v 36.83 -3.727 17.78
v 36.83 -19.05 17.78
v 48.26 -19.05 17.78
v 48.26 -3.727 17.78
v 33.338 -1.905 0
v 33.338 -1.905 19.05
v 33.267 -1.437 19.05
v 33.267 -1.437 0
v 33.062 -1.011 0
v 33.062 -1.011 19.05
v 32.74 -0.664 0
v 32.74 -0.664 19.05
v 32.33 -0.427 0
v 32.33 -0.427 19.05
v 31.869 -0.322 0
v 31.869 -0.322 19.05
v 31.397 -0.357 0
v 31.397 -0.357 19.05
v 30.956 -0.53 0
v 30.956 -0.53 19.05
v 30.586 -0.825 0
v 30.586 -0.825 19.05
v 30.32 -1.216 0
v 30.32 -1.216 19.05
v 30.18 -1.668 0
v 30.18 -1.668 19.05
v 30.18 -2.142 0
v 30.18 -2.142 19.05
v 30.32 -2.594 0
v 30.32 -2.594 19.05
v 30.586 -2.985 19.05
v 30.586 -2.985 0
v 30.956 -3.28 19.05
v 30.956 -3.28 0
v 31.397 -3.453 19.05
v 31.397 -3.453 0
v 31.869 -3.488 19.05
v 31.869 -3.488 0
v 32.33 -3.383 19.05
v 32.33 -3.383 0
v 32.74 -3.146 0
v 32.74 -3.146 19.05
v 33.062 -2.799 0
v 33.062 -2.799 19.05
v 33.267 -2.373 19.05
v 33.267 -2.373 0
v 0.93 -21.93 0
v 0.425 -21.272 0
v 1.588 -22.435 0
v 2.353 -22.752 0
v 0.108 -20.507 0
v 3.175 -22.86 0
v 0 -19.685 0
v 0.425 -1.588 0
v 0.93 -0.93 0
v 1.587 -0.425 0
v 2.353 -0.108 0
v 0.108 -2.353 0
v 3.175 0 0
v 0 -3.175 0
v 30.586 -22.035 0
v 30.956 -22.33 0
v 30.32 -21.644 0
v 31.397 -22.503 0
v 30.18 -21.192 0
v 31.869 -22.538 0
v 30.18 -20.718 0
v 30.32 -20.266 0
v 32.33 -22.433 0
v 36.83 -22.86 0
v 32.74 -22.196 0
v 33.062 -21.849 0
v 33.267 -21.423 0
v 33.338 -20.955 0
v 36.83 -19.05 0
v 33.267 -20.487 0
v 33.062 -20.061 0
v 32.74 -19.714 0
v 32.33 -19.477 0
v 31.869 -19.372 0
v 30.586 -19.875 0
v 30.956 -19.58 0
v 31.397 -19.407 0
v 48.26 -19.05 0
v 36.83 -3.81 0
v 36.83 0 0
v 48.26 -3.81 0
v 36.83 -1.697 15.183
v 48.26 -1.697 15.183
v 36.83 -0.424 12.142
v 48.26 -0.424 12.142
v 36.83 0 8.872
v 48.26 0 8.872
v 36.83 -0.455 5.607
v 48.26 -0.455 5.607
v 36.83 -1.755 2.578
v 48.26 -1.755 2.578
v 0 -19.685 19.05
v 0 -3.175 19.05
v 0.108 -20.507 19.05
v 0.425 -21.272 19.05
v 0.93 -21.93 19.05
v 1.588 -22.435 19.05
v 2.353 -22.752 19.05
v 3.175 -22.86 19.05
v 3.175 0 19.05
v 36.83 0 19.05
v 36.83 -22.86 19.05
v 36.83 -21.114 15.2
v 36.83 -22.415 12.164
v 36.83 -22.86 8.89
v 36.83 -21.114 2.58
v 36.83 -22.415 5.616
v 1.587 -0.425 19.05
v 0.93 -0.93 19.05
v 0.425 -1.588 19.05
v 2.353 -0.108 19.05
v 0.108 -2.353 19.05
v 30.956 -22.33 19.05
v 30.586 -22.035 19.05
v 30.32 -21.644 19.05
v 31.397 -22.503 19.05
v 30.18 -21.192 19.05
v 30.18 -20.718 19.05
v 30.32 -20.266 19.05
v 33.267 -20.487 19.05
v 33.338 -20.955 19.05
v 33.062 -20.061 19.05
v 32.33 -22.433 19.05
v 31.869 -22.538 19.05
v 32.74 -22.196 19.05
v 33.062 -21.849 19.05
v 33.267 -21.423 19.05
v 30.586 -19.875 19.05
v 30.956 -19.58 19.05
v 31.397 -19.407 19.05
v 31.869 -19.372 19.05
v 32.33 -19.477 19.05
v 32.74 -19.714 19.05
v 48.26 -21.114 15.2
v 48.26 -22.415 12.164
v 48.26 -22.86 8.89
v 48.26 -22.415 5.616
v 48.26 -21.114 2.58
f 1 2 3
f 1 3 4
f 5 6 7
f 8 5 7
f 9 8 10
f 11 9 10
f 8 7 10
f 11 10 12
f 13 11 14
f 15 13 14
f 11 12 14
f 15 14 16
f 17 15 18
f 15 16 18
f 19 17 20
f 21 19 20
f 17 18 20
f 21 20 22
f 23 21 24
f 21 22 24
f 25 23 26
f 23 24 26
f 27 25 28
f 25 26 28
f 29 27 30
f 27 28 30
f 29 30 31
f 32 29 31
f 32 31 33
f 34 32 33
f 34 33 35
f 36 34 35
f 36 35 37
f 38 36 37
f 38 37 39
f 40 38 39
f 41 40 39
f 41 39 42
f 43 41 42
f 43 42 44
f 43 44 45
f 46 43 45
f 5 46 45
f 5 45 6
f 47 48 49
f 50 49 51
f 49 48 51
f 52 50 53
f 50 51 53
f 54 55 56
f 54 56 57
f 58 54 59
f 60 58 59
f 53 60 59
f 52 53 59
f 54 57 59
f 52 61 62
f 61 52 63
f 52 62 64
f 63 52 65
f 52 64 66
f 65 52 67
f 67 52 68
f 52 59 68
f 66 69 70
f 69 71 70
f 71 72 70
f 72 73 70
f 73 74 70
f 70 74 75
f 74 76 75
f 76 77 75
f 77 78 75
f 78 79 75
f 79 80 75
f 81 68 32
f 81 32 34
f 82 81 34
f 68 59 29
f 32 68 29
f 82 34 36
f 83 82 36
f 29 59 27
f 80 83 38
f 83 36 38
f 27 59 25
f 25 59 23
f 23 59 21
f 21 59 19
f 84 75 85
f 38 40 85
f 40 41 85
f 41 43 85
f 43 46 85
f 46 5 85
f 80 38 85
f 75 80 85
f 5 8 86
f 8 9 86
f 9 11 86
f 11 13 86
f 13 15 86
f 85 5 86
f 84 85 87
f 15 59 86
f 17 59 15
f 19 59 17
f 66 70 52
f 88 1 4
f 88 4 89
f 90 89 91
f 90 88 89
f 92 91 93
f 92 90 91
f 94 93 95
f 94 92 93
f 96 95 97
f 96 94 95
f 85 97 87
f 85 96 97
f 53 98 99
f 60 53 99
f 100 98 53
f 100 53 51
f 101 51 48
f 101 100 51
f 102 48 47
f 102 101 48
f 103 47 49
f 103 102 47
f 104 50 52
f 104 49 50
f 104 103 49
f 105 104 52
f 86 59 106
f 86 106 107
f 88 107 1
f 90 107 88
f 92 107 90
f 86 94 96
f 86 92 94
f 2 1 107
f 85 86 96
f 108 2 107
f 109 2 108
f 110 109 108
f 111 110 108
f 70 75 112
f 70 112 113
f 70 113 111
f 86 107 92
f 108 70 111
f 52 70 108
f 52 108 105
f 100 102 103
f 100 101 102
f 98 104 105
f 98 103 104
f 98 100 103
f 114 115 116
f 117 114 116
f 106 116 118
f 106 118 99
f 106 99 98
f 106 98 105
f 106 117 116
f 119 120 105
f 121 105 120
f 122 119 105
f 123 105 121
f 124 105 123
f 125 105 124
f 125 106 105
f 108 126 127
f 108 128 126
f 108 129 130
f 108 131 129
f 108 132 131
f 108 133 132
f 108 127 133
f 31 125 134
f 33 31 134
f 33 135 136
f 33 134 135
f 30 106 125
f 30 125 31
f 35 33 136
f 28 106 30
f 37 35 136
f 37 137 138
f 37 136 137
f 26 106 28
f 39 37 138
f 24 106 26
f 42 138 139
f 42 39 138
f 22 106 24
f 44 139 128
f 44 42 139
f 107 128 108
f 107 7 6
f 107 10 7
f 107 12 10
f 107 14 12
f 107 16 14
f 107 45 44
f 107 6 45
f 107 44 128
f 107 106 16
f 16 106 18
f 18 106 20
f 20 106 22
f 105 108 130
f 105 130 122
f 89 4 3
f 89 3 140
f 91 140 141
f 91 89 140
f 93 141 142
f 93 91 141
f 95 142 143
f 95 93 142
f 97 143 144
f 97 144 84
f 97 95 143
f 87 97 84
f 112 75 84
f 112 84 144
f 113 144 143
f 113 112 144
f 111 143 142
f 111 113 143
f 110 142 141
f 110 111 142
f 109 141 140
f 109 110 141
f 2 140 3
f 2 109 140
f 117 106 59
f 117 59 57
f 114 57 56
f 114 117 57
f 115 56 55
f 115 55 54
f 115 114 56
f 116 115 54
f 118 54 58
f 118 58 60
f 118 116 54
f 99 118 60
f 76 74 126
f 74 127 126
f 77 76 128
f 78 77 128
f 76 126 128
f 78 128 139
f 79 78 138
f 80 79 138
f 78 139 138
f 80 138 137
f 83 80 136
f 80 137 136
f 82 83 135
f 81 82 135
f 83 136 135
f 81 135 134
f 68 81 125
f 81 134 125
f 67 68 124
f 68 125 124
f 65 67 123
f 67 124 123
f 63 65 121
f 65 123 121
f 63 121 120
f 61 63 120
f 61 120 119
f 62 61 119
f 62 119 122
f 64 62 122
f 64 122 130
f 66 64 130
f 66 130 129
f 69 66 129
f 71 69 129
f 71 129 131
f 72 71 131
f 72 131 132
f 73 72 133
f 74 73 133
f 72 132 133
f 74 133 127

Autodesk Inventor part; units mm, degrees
ref_plane "YZ Plane" through (0, 0, 0) normal (1, 0, 0) x (0, 1, 0)
ref_plane "XZ Plane" through (0, 0, 0) normal (0, 1, 0) x (-1, 0, 0)
ref_plane "XY Plane" through (0, 0, 0) normal (0, 0, 1) x (1, 0, 0)
sketch "Sketch1" plane through (0, 0, 0) normal (0, 0, 1) x (1, 0, 0)
  line L0 (0, 0) -> (36.83, 0)
  line L1 (36.83, 0) -> (36.83, -22.86)
  line L2 (36.83, -22.86) -> (0, -22.86)
  line L3 (0, -22.86) -> (0, 0)
  dimension "d0" = 36.83
  dimension "d1" = 22.86
extrude "Extrusion1" add sketch "Sketch1" along normal blind 19.05
fillet "Fillet1" radius 3.175 2 edges at (0, 0, 9.525) (0, -22.86, 9.525)
sketch "Sketch2" plane through (36.83, -22.86, 0) normal (1, 0, 0) x (0, 0, -1)
  line L0 (0, 22.86) -> (-19.05, 22.86) projected
  line L1 (0, 0) -> (-19.05, 0) projected
  line L2 (-19.05, 0) -> (-19.05, 22.86) projected
  arc A0 (0, 19.05) -> (-17.78, 19.1328) centre (-8.93, 10.4897) ccw
  arc A1 (-17.78, 3.81) -> (0, 3.81) centre (-8.89, 12.2767) ccw
  line L3 (0, 19.05) -> (0, 3.81)
  line L4 (0, 22.86) -> (0, 0) projected
  line L5 (-19.05, 3.175) -> (0, 3.175) projected
  line L6 (-17.78, 3.81) -> (-17.78, 19.1328)
  dimension "d5" = 3.81
  dimension "d6" = 3.81
  dimension "d7" = 1.27
  dimension "d8" = 1.27
extrude "Extrusion2" add sketch "Sketch2" along normal blind 11.43 contours A0 L3 A1 L5 L6 | A1 L5
sketch "Sketch3" plane through (0, 0, 19.05) normal (0, 0, 1) x (1, 0, 0)
  circle A0 centre (31.75, -1.905) radius 1.5875
  line L0 (36.83, -22.86) -> (36.83, 0) projected
  line L1 (36.83, 0) -> (3.175, 0) projected
  circle A1 centre (31.75, -20.955) radius 1.5875
  line L2 (3.175, -22.86) -> (36.83, -22.86) projected
  point P0 (0, 0)
  dimension "d11" = 3.175
  dimension "d12" = 5.08
  dimension "d13" = 1.905
  dimension "d14" = 1.905
  dimension "d15" = 3.175
extrude "Extrusion3" cut sketch "Sketch3" against normal blind 25.4
properties part number "MotorFrame" material "ABS Plastic"
